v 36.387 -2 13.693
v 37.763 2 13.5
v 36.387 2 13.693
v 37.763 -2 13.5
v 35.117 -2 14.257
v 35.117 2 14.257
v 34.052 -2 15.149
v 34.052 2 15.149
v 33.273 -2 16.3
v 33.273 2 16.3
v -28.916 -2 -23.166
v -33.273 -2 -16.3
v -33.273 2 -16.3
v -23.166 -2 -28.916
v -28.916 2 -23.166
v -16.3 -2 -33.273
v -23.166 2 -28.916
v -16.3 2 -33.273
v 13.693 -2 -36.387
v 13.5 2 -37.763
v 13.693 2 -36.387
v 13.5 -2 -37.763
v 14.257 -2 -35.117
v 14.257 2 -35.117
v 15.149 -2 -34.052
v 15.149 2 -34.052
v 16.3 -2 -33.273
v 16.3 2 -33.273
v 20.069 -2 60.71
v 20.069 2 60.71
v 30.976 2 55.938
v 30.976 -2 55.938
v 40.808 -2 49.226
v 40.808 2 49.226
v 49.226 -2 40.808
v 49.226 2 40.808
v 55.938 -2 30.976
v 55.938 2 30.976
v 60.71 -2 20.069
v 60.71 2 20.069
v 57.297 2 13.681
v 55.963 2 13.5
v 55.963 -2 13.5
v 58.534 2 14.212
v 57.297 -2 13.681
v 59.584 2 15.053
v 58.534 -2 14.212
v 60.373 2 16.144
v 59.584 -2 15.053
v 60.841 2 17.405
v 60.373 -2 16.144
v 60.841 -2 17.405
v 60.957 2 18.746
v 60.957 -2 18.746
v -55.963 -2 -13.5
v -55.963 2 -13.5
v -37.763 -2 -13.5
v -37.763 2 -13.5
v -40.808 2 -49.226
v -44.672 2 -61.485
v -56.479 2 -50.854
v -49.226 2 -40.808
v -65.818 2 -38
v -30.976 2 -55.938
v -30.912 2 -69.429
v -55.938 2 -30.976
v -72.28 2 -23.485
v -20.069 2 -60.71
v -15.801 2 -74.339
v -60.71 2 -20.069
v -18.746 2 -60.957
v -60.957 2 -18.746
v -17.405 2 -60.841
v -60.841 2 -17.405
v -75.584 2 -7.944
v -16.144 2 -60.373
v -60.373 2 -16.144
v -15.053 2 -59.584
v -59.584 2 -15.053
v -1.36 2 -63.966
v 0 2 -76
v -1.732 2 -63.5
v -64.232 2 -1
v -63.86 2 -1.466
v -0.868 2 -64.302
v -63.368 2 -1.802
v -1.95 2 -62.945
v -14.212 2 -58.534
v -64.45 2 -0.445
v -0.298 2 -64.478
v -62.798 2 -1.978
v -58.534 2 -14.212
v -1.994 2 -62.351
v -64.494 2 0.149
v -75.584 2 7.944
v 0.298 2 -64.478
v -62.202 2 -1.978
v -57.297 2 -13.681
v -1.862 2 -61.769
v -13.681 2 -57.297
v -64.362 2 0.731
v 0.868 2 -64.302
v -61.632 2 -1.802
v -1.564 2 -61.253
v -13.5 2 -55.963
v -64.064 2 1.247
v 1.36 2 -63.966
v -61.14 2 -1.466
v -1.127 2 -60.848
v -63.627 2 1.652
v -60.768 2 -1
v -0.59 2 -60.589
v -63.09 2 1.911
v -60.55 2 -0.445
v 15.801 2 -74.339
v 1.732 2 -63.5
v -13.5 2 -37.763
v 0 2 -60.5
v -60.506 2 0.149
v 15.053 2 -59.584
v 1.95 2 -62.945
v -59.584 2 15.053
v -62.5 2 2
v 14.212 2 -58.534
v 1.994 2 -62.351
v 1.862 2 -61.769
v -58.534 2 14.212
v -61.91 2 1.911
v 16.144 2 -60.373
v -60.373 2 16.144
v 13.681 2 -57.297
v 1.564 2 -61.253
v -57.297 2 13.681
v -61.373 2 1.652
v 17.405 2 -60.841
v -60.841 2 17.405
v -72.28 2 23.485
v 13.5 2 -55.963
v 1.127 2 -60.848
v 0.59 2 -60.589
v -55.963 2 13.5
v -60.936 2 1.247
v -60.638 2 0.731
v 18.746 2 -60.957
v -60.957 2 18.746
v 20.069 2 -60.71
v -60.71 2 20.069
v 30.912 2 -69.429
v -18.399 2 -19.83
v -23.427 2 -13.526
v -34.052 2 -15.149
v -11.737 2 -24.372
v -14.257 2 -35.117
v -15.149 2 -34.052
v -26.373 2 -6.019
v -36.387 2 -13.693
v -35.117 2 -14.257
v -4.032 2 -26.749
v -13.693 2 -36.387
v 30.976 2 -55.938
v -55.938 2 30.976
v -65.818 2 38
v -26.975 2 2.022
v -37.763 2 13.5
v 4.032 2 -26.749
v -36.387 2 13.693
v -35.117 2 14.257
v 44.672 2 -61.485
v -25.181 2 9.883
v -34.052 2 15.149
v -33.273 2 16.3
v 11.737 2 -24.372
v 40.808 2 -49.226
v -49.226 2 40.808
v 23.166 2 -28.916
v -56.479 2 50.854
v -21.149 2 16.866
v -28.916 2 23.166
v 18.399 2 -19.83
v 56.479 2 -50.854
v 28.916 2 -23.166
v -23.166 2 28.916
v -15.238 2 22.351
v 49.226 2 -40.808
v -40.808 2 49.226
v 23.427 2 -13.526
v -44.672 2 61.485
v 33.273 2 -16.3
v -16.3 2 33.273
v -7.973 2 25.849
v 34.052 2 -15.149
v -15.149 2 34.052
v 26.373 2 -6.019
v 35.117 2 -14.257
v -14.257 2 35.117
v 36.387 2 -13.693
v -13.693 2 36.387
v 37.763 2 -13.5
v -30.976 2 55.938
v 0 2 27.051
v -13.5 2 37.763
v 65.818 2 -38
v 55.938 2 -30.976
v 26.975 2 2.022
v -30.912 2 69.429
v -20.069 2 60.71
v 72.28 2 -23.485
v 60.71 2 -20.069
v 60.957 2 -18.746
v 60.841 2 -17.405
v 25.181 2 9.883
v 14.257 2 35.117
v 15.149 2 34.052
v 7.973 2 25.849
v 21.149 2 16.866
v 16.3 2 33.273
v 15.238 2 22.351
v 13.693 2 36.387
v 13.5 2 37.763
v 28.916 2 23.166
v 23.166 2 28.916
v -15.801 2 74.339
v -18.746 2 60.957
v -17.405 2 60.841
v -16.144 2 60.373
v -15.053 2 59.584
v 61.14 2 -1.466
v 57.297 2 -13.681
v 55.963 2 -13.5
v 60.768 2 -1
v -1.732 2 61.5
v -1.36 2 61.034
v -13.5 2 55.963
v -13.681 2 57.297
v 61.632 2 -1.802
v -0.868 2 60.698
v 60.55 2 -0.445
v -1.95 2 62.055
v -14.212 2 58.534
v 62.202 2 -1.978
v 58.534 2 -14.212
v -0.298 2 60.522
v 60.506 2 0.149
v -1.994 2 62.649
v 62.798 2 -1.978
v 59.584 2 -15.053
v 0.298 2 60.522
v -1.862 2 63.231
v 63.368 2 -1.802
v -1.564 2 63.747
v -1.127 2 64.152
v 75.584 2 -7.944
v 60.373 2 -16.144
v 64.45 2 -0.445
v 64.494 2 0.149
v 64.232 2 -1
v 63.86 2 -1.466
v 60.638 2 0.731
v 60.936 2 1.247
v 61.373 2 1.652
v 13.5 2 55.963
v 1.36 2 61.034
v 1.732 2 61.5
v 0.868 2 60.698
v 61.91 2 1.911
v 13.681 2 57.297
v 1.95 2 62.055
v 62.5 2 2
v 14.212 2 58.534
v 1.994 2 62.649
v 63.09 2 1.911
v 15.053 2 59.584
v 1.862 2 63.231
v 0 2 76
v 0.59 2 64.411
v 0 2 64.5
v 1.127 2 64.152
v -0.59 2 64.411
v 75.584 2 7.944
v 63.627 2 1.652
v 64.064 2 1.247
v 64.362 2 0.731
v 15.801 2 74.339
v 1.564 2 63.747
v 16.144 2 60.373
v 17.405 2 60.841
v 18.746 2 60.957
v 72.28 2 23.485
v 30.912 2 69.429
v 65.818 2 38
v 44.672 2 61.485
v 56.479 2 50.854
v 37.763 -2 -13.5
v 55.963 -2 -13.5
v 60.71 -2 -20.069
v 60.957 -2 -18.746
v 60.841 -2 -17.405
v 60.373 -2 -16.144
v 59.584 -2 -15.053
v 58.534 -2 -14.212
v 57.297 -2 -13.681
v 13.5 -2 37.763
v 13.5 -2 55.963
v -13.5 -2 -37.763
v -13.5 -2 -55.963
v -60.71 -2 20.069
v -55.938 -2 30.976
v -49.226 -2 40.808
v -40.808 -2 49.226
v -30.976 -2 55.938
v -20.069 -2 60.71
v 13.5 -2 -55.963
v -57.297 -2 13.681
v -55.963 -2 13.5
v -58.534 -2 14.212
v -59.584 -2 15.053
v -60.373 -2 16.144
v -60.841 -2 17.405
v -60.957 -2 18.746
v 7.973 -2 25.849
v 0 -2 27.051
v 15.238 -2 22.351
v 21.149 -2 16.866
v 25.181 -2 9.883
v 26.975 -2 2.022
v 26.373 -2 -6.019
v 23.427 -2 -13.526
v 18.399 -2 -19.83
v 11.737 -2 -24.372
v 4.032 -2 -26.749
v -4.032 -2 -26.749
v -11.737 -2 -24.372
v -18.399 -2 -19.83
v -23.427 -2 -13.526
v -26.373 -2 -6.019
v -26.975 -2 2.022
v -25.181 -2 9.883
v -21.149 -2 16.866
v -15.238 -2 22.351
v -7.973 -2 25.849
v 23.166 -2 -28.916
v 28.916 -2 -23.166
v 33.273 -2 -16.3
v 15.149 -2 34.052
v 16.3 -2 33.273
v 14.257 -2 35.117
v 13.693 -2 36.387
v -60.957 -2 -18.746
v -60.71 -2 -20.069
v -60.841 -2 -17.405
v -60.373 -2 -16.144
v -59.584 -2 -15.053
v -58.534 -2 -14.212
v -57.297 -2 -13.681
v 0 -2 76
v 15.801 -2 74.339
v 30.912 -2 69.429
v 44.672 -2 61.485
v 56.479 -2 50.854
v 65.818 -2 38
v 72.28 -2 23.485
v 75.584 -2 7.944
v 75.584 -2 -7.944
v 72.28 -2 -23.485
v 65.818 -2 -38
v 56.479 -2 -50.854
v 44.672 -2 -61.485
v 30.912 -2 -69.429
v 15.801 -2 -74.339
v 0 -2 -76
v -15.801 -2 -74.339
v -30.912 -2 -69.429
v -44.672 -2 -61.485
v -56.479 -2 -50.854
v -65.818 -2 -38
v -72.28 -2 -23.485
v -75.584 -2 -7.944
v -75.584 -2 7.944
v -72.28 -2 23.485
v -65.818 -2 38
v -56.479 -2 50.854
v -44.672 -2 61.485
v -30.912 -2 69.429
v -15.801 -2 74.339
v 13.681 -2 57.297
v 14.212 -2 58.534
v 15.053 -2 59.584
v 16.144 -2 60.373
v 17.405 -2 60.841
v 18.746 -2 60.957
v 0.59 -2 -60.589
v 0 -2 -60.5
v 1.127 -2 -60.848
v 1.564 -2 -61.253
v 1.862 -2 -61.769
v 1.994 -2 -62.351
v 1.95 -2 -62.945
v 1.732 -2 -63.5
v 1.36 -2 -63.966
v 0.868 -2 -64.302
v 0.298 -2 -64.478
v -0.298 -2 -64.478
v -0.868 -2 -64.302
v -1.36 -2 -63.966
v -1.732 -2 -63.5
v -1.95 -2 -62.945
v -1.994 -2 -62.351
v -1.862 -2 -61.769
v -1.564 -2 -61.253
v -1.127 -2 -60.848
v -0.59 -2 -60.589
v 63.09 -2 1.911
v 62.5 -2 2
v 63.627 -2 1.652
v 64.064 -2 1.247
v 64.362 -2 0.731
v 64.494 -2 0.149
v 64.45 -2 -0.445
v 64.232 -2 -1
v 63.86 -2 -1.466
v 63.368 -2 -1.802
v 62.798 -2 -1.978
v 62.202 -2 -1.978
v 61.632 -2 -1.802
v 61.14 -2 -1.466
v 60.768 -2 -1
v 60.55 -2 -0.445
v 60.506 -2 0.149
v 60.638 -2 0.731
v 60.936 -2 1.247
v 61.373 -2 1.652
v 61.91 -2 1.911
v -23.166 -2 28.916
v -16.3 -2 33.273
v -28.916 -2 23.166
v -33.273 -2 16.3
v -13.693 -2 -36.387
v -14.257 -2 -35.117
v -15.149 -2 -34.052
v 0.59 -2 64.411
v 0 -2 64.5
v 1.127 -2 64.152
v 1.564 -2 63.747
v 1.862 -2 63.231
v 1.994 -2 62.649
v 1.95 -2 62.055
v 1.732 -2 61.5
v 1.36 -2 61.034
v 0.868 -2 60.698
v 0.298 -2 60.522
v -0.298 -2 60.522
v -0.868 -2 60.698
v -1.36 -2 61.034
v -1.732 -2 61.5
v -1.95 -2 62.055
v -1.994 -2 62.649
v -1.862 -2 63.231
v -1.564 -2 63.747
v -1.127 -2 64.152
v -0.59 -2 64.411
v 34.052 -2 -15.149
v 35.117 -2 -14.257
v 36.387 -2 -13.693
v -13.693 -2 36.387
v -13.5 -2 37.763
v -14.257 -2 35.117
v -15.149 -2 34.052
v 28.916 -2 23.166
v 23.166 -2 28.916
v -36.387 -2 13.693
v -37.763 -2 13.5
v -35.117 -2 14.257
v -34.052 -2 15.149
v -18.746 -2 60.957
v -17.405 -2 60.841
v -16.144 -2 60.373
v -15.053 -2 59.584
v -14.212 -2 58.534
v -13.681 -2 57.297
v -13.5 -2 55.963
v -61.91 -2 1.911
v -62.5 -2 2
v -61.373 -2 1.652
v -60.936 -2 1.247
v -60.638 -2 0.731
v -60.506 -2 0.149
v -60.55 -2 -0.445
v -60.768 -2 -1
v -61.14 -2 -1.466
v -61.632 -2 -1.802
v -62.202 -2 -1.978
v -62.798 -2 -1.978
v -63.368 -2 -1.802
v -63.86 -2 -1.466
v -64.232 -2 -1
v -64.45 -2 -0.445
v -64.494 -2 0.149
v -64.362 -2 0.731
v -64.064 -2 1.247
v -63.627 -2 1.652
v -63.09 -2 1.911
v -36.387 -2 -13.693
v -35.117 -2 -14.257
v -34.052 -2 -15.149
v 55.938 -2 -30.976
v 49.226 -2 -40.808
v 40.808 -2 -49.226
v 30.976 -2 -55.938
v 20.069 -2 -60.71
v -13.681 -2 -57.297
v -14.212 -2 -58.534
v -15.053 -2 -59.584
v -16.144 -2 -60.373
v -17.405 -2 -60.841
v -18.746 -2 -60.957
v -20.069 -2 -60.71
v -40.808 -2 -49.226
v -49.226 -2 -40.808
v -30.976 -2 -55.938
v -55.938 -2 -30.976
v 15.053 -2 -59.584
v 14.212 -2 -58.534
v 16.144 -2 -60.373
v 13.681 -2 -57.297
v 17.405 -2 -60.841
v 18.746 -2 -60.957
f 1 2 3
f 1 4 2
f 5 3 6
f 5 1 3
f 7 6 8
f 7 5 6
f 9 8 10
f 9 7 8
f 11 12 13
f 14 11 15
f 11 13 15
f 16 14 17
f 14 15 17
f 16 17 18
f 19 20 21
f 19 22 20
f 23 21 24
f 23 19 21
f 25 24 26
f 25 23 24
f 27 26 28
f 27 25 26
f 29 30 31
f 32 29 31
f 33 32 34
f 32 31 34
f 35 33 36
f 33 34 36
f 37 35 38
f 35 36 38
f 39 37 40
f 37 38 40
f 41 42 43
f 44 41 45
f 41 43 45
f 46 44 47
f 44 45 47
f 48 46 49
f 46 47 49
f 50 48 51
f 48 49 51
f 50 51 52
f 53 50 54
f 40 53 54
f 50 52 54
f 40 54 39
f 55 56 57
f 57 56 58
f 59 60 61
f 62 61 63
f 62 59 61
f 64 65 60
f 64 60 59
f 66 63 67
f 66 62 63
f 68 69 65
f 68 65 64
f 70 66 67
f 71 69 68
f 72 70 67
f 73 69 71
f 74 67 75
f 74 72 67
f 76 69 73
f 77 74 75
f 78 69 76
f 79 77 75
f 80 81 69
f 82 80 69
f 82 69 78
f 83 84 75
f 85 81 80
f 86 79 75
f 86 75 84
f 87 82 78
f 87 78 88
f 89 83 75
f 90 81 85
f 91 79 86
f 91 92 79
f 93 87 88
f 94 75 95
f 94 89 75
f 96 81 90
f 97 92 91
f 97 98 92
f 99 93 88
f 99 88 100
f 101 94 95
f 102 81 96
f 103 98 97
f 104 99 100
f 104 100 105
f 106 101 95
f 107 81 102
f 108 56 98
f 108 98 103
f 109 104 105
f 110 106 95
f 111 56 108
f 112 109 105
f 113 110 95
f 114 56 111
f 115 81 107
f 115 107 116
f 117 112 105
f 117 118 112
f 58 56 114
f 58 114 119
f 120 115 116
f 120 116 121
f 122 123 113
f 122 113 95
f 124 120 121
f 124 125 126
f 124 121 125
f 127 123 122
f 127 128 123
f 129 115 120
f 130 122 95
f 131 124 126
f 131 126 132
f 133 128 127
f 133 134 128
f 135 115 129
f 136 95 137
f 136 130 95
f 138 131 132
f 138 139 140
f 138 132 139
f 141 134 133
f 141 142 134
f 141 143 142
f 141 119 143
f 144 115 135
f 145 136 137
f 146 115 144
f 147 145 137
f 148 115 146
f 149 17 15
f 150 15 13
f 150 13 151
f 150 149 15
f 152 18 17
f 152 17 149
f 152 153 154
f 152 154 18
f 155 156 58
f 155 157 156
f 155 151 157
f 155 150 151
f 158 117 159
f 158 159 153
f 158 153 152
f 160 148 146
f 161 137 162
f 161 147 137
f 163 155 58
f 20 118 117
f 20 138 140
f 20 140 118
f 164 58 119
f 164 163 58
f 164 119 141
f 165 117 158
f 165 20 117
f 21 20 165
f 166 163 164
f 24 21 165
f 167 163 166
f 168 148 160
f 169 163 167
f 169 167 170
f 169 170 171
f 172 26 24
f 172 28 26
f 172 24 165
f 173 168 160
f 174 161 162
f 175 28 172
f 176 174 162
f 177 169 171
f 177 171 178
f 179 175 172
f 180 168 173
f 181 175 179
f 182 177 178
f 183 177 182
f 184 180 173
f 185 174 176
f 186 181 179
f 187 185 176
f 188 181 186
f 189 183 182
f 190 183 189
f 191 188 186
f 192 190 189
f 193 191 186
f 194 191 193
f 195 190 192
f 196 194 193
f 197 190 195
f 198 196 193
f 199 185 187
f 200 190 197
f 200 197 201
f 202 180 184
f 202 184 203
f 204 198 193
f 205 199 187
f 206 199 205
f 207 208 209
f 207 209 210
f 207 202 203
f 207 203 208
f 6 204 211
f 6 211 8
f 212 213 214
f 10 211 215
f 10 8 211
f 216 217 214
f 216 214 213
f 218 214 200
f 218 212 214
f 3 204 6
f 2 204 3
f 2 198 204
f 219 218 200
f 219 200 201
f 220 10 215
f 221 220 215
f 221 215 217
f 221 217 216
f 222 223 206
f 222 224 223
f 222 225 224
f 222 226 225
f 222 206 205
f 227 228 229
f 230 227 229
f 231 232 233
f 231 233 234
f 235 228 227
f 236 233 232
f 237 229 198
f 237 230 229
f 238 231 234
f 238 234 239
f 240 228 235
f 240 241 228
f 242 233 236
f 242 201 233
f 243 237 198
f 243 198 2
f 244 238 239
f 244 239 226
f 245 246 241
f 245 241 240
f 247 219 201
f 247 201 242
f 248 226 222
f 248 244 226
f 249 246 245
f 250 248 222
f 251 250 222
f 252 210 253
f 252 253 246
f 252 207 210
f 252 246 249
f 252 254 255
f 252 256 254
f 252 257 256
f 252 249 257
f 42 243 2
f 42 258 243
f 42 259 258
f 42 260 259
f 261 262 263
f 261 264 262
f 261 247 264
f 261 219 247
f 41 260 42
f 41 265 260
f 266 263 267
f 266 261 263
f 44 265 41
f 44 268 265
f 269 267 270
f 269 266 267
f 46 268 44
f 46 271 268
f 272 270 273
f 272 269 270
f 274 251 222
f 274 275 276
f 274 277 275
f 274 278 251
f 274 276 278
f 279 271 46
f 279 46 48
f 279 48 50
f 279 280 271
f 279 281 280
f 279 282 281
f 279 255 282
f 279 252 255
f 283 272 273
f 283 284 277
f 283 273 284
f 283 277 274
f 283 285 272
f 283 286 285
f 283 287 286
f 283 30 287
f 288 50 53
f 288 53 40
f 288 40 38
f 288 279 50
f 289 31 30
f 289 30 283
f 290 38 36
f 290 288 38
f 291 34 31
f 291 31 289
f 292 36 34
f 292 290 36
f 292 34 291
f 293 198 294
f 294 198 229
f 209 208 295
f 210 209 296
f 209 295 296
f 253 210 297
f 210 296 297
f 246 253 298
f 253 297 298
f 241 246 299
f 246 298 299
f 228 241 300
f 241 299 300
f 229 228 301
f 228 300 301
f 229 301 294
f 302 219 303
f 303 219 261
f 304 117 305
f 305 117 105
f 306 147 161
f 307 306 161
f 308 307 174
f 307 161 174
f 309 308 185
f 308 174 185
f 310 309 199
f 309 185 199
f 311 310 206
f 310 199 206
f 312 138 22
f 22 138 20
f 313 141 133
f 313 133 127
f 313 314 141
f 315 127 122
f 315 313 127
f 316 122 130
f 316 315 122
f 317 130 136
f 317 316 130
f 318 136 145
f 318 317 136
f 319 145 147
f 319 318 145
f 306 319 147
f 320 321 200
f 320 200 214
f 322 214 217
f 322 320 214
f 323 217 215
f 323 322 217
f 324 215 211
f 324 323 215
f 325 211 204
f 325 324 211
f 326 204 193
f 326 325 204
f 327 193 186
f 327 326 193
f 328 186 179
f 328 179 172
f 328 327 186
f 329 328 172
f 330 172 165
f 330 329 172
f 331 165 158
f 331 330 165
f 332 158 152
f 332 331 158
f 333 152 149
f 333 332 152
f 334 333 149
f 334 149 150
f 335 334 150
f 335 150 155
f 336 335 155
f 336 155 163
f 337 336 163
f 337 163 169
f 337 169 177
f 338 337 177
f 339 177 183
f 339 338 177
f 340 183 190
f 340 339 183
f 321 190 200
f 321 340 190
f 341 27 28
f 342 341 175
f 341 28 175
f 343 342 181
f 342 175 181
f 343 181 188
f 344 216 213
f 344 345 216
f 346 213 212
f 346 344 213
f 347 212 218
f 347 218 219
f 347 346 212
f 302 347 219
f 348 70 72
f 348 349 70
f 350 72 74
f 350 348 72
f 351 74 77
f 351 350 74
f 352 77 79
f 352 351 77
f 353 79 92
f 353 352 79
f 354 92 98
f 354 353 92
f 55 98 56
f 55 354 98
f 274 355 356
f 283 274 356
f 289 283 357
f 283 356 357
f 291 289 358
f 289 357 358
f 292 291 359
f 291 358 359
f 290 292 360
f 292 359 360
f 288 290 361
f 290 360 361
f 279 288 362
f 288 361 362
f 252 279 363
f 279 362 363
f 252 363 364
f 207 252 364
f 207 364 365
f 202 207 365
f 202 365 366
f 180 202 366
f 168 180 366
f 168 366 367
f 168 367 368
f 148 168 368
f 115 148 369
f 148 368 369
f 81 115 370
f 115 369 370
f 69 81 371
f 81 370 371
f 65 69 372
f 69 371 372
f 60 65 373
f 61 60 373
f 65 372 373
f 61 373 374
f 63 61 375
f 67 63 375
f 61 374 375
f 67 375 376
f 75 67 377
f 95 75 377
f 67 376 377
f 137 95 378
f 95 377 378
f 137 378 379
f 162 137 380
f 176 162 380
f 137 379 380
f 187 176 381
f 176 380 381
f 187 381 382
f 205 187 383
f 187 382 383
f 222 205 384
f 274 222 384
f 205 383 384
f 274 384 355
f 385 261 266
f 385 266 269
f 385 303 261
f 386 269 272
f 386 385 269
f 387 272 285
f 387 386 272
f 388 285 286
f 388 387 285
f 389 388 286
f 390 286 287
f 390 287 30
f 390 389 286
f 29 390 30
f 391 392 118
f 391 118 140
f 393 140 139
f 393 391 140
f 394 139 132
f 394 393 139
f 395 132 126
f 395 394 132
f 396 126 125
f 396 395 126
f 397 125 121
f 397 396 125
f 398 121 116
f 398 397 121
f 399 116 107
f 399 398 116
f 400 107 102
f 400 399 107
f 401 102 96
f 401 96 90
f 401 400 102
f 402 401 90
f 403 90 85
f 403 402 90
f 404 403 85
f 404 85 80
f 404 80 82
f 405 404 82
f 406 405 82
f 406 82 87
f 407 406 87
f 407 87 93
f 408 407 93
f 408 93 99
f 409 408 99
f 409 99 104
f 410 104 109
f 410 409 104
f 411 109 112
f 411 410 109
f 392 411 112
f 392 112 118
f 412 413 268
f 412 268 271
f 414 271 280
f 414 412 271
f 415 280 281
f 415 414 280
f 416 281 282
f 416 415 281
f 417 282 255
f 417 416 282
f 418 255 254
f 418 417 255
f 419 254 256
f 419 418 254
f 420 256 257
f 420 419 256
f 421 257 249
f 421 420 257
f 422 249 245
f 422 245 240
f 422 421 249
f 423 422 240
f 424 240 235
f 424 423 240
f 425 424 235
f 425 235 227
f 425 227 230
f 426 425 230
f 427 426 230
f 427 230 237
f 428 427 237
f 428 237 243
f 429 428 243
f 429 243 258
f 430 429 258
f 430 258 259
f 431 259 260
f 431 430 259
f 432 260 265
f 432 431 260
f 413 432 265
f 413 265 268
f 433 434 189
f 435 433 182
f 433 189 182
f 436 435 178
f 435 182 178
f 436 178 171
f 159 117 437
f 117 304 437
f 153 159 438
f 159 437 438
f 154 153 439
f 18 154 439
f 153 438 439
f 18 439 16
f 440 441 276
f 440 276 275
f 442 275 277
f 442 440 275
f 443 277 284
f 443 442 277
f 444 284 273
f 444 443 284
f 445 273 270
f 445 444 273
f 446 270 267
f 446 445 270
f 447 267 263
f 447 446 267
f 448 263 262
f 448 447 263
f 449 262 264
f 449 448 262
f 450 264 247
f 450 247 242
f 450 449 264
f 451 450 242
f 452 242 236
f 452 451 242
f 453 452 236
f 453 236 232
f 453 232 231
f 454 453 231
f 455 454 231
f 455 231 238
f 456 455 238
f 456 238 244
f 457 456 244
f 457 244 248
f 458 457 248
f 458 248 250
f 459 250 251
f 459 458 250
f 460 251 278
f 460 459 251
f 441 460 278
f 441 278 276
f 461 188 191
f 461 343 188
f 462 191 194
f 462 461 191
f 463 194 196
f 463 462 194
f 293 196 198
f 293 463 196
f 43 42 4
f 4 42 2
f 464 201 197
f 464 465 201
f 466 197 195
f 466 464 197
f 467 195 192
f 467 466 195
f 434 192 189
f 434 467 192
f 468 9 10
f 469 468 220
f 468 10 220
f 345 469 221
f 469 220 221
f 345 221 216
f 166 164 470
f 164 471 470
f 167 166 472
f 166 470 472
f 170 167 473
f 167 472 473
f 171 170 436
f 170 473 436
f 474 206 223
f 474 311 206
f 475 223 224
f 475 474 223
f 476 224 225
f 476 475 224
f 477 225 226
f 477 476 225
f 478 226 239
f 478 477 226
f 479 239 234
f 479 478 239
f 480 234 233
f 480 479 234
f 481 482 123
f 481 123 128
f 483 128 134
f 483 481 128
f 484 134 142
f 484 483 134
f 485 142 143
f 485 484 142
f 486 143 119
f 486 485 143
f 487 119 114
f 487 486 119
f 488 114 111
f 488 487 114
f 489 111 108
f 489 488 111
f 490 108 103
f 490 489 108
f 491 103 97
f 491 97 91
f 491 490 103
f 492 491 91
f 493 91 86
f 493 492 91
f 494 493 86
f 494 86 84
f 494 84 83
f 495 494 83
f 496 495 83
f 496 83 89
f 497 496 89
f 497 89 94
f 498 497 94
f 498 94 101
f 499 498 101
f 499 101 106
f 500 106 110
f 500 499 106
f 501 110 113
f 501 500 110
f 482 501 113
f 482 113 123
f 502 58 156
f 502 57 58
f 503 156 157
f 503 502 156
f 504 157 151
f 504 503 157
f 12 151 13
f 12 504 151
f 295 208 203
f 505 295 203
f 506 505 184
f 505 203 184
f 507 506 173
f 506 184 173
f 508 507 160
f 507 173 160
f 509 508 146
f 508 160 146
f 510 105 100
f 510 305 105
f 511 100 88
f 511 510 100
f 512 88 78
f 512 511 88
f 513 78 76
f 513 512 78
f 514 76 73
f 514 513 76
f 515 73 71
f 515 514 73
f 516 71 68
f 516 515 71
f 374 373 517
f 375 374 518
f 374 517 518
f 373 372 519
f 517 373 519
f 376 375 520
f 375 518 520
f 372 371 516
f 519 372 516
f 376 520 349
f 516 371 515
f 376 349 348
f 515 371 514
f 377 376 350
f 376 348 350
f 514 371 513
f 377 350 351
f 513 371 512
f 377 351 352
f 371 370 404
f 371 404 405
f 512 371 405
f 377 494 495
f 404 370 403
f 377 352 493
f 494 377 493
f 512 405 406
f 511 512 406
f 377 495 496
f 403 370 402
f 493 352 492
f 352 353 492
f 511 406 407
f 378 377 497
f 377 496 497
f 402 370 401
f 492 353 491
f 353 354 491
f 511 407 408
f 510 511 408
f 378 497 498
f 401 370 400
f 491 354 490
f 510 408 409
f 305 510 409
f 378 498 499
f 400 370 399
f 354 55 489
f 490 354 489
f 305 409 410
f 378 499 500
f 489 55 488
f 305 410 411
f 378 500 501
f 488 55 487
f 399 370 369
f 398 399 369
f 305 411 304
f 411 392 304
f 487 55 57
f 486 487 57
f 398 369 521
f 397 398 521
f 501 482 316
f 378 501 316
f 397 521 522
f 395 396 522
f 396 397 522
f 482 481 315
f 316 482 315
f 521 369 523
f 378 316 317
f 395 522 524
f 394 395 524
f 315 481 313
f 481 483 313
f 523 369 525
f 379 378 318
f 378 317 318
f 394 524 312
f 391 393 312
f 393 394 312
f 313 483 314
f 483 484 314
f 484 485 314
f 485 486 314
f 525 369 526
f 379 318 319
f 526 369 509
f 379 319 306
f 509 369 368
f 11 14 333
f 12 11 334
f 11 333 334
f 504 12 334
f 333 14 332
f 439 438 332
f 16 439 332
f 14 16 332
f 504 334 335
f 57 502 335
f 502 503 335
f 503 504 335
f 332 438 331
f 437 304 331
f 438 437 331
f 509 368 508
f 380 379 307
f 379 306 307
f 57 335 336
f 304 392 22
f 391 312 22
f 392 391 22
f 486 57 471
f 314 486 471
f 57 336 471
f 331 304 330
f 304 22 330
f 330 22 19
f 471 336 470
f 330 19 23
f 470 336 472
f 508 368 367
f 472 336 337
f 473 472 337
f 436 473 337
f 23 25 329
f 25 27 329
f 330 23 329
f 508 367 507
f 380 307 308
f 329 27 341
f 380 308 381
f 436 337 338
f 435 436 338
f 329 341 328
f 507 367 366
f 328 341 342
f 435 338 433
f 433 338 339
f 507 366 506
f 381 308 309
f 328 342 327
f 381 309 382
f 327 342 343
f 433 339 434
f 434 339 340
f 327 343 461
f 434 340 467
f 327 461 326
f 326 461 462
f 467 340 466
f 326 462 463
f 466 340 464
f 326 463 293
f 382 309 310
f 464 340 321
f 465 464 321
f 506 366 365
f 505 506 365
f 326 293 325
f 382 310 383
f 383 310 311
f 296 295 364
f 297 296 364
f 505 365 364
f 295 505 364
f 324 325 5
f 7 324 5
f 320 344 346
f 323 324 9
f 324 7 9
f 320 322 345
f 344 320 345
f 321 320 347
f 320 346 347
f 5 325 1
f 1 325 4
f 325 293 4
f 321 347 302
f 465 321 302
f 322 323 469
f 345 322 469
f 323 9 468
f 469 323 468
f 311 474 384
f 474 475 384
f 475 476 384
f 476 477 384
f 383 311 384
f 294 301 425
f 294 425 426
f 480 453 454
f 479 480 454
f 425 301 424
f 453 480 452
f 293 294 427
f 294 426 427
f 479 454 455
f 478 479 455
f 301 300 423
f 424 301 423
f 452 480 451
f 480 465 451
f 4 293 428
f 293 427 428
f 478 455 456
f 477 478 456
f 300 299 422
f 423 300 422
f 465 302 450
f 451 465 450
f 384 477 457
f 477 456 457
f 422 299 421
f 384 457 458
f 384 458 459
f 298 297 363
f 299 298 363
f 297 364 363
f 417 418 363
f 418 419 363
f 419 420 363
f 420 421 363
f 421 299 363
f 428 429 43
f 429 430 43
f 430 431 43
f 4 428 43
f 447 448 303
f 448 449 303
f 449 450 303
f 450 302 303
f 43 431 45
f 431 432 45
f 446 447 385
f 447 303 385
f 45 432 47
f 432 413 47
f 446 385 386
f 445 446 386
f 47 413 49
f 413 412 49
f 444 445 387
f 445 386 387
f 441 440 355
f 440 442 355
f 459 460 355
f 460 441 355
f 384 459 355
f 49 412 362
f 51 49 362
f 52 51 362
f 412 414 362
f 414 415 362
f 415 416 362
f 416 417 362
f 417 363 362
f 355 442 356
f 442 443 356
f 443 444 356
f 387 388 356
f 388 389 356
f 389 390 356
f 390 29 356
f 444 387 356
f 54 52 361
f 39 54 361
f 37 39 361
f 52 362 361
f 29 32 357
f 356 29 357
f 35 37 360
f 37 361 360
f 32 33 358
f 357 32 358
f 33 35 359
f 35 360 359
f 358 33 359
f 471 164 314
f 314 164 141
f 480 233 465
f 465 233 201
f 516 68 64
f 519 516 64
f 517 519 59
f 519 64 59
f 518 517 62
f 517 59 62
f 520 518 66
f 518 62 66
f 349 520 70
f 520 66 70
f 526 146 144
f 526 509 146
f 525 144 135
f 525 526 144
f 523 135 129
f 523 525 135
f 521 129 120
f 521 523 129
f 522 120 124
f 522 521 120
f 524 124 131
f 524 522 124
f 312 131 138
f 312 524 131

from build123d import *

# Parameters (mm, degrees)
BOSS_EXTRUDE1_DEPTH      = 2
BOSS_EXTRUDE1_DEPTH_BACK = 2
SKETCH1_R                = 76
SKETCH1_R_2              = 27.051
SKETCH1_R_3              = 2
CUT_EXTRUDE2_DEPTH       = 108.554637278
FILLET1_R                = 5


with BuildPart() as part:
    # Sketch1 → Boss-Extrude1 (new, two sides: drawn at the far end of the back side and taken through both)
    with BuildSketch(Plane(origin=(0, 0, 0), x_dir=(1, 0, 0), z_dir=(0, 1, 0)).offset(-BOSS_EXTRUDE1_DEPTH_BACK)):
        Circle(SKETCH1_R)
        Circle(SKETCH1_R_2, mode=Mode.SUBTRACT)
        with Locations((0, 62.5)):
            Circle(SKETCH1_R_3, mode=Mode.SUBTRACT)
        with Locations((62.5, 0)):
            Circle(SKETCH1_R_3, mode=Mode.SUBTRACT)
        with Locations((0, -62.5)):
            Circle(SKETCH1_R_3, mode=Mode.SUBTRACT)
        with Locations((-62.5, 0)):
            Circle(SKETCH1_R_3, mode=Mode.SUBTRACT)
    extrude(amount=BOSS_EXTRUDE1_DEPTH + BOSS_EXTRUDE1_DEPTH_BACK)

    # Sketch4 → Cut-Extrude2 (cut, through all)
    with BuildSketch(Plane(origin=(0, 2, 0), x_dir=(1, 0, 0), z_dir=(0, 1, 0))):
        with BuildLine():
            ThreePointArc((62.5, 13.5), (45.213382975, 45.213382975), (13.5, 62.5))
            Line((13.5, 62.5), (13.5, 34.504008477))
            ThreePointArc((13.5, 34.504008477), (26.19901335, 26.19901335), (34.504008477, 13.5))
            Line((34.504008477, 13.5), (62.5, 13.5))
        make_face()
        with BuildLine():
            ThreePointArc((-34.504008477, 13.5), (-26.19901335, 26.19901335), (-13.5, 34.504008477))
            Line((-13.5, 34.504008477), (-13.5, 62.5))
            ThreePointArc((-13.5, 62.5), (-45.213382975, 45.213382975), (-62.5, 13.5))
            Line((-62.5, 13.5), (-34.504008477, 13.5))
        make_face()
        with BuildLine():
            Line((62.5, -13.5), (34.504008477, -13.5))
            ThreePointArc((34.504008477, -13.5), (26.19901335, -26.19901335), (13.5, -34.504008477))
            Line((13.5, -34.504008477), (13.5, -62.5))
            ThreePointArc((13.5, -62.5), (45.213382975, -45.213382975), (62.5, -13.5))
        make_face()
        with BuildLine():
            ThreePointArc((-13.5, -34.504008477), (-26.19901335, -26.19901335), (-34.504008477, -13.5))
            Line((-34.504008477, -13.5), (-62.5, -13.5))
            ThreePointArc((-62.5, -13.5), (-45.213382975, -45.213382975), (-13.5, -62.5))
            Line((-13.5, -62.5), (-13.5, -34.504008477))
        make_face()
    extrude(amount=-CUT_EXTRUDE2_DEPTH, mode=Mode.SUBTRACT)

    # Fillet1
    fillet1_edges = [part.edges().sort_by_distance(p)[0] for p in [
        (-13.5, 0, 34.504008477),
        (-13.5, 0, 62.5),
        (-34.504008477, 0, 13.5),
        (-62.5, 0, 13.5),
        (13.5, 0, 62.5),
        (13.5, 0, 34.504008477),
        (34.504008477, 0, 13.5),
        (62.5, 0, 13.5),
        (34.504008477, 0, -13.5),
        (13.5, 0, -34.504008477),
        (62.5, 0, -13.5),
        (13.5, 0, -62.5),
        (-62.5, 0, -13.5),
        (-34.504008477, 0, -13.5),
        (-13.5, 0, -34.504008477),
        (-13.5, 0, -62.5),
    ]]
    fillet(fillet1_edges, radius=FILLET1_R)


solid = part.part
